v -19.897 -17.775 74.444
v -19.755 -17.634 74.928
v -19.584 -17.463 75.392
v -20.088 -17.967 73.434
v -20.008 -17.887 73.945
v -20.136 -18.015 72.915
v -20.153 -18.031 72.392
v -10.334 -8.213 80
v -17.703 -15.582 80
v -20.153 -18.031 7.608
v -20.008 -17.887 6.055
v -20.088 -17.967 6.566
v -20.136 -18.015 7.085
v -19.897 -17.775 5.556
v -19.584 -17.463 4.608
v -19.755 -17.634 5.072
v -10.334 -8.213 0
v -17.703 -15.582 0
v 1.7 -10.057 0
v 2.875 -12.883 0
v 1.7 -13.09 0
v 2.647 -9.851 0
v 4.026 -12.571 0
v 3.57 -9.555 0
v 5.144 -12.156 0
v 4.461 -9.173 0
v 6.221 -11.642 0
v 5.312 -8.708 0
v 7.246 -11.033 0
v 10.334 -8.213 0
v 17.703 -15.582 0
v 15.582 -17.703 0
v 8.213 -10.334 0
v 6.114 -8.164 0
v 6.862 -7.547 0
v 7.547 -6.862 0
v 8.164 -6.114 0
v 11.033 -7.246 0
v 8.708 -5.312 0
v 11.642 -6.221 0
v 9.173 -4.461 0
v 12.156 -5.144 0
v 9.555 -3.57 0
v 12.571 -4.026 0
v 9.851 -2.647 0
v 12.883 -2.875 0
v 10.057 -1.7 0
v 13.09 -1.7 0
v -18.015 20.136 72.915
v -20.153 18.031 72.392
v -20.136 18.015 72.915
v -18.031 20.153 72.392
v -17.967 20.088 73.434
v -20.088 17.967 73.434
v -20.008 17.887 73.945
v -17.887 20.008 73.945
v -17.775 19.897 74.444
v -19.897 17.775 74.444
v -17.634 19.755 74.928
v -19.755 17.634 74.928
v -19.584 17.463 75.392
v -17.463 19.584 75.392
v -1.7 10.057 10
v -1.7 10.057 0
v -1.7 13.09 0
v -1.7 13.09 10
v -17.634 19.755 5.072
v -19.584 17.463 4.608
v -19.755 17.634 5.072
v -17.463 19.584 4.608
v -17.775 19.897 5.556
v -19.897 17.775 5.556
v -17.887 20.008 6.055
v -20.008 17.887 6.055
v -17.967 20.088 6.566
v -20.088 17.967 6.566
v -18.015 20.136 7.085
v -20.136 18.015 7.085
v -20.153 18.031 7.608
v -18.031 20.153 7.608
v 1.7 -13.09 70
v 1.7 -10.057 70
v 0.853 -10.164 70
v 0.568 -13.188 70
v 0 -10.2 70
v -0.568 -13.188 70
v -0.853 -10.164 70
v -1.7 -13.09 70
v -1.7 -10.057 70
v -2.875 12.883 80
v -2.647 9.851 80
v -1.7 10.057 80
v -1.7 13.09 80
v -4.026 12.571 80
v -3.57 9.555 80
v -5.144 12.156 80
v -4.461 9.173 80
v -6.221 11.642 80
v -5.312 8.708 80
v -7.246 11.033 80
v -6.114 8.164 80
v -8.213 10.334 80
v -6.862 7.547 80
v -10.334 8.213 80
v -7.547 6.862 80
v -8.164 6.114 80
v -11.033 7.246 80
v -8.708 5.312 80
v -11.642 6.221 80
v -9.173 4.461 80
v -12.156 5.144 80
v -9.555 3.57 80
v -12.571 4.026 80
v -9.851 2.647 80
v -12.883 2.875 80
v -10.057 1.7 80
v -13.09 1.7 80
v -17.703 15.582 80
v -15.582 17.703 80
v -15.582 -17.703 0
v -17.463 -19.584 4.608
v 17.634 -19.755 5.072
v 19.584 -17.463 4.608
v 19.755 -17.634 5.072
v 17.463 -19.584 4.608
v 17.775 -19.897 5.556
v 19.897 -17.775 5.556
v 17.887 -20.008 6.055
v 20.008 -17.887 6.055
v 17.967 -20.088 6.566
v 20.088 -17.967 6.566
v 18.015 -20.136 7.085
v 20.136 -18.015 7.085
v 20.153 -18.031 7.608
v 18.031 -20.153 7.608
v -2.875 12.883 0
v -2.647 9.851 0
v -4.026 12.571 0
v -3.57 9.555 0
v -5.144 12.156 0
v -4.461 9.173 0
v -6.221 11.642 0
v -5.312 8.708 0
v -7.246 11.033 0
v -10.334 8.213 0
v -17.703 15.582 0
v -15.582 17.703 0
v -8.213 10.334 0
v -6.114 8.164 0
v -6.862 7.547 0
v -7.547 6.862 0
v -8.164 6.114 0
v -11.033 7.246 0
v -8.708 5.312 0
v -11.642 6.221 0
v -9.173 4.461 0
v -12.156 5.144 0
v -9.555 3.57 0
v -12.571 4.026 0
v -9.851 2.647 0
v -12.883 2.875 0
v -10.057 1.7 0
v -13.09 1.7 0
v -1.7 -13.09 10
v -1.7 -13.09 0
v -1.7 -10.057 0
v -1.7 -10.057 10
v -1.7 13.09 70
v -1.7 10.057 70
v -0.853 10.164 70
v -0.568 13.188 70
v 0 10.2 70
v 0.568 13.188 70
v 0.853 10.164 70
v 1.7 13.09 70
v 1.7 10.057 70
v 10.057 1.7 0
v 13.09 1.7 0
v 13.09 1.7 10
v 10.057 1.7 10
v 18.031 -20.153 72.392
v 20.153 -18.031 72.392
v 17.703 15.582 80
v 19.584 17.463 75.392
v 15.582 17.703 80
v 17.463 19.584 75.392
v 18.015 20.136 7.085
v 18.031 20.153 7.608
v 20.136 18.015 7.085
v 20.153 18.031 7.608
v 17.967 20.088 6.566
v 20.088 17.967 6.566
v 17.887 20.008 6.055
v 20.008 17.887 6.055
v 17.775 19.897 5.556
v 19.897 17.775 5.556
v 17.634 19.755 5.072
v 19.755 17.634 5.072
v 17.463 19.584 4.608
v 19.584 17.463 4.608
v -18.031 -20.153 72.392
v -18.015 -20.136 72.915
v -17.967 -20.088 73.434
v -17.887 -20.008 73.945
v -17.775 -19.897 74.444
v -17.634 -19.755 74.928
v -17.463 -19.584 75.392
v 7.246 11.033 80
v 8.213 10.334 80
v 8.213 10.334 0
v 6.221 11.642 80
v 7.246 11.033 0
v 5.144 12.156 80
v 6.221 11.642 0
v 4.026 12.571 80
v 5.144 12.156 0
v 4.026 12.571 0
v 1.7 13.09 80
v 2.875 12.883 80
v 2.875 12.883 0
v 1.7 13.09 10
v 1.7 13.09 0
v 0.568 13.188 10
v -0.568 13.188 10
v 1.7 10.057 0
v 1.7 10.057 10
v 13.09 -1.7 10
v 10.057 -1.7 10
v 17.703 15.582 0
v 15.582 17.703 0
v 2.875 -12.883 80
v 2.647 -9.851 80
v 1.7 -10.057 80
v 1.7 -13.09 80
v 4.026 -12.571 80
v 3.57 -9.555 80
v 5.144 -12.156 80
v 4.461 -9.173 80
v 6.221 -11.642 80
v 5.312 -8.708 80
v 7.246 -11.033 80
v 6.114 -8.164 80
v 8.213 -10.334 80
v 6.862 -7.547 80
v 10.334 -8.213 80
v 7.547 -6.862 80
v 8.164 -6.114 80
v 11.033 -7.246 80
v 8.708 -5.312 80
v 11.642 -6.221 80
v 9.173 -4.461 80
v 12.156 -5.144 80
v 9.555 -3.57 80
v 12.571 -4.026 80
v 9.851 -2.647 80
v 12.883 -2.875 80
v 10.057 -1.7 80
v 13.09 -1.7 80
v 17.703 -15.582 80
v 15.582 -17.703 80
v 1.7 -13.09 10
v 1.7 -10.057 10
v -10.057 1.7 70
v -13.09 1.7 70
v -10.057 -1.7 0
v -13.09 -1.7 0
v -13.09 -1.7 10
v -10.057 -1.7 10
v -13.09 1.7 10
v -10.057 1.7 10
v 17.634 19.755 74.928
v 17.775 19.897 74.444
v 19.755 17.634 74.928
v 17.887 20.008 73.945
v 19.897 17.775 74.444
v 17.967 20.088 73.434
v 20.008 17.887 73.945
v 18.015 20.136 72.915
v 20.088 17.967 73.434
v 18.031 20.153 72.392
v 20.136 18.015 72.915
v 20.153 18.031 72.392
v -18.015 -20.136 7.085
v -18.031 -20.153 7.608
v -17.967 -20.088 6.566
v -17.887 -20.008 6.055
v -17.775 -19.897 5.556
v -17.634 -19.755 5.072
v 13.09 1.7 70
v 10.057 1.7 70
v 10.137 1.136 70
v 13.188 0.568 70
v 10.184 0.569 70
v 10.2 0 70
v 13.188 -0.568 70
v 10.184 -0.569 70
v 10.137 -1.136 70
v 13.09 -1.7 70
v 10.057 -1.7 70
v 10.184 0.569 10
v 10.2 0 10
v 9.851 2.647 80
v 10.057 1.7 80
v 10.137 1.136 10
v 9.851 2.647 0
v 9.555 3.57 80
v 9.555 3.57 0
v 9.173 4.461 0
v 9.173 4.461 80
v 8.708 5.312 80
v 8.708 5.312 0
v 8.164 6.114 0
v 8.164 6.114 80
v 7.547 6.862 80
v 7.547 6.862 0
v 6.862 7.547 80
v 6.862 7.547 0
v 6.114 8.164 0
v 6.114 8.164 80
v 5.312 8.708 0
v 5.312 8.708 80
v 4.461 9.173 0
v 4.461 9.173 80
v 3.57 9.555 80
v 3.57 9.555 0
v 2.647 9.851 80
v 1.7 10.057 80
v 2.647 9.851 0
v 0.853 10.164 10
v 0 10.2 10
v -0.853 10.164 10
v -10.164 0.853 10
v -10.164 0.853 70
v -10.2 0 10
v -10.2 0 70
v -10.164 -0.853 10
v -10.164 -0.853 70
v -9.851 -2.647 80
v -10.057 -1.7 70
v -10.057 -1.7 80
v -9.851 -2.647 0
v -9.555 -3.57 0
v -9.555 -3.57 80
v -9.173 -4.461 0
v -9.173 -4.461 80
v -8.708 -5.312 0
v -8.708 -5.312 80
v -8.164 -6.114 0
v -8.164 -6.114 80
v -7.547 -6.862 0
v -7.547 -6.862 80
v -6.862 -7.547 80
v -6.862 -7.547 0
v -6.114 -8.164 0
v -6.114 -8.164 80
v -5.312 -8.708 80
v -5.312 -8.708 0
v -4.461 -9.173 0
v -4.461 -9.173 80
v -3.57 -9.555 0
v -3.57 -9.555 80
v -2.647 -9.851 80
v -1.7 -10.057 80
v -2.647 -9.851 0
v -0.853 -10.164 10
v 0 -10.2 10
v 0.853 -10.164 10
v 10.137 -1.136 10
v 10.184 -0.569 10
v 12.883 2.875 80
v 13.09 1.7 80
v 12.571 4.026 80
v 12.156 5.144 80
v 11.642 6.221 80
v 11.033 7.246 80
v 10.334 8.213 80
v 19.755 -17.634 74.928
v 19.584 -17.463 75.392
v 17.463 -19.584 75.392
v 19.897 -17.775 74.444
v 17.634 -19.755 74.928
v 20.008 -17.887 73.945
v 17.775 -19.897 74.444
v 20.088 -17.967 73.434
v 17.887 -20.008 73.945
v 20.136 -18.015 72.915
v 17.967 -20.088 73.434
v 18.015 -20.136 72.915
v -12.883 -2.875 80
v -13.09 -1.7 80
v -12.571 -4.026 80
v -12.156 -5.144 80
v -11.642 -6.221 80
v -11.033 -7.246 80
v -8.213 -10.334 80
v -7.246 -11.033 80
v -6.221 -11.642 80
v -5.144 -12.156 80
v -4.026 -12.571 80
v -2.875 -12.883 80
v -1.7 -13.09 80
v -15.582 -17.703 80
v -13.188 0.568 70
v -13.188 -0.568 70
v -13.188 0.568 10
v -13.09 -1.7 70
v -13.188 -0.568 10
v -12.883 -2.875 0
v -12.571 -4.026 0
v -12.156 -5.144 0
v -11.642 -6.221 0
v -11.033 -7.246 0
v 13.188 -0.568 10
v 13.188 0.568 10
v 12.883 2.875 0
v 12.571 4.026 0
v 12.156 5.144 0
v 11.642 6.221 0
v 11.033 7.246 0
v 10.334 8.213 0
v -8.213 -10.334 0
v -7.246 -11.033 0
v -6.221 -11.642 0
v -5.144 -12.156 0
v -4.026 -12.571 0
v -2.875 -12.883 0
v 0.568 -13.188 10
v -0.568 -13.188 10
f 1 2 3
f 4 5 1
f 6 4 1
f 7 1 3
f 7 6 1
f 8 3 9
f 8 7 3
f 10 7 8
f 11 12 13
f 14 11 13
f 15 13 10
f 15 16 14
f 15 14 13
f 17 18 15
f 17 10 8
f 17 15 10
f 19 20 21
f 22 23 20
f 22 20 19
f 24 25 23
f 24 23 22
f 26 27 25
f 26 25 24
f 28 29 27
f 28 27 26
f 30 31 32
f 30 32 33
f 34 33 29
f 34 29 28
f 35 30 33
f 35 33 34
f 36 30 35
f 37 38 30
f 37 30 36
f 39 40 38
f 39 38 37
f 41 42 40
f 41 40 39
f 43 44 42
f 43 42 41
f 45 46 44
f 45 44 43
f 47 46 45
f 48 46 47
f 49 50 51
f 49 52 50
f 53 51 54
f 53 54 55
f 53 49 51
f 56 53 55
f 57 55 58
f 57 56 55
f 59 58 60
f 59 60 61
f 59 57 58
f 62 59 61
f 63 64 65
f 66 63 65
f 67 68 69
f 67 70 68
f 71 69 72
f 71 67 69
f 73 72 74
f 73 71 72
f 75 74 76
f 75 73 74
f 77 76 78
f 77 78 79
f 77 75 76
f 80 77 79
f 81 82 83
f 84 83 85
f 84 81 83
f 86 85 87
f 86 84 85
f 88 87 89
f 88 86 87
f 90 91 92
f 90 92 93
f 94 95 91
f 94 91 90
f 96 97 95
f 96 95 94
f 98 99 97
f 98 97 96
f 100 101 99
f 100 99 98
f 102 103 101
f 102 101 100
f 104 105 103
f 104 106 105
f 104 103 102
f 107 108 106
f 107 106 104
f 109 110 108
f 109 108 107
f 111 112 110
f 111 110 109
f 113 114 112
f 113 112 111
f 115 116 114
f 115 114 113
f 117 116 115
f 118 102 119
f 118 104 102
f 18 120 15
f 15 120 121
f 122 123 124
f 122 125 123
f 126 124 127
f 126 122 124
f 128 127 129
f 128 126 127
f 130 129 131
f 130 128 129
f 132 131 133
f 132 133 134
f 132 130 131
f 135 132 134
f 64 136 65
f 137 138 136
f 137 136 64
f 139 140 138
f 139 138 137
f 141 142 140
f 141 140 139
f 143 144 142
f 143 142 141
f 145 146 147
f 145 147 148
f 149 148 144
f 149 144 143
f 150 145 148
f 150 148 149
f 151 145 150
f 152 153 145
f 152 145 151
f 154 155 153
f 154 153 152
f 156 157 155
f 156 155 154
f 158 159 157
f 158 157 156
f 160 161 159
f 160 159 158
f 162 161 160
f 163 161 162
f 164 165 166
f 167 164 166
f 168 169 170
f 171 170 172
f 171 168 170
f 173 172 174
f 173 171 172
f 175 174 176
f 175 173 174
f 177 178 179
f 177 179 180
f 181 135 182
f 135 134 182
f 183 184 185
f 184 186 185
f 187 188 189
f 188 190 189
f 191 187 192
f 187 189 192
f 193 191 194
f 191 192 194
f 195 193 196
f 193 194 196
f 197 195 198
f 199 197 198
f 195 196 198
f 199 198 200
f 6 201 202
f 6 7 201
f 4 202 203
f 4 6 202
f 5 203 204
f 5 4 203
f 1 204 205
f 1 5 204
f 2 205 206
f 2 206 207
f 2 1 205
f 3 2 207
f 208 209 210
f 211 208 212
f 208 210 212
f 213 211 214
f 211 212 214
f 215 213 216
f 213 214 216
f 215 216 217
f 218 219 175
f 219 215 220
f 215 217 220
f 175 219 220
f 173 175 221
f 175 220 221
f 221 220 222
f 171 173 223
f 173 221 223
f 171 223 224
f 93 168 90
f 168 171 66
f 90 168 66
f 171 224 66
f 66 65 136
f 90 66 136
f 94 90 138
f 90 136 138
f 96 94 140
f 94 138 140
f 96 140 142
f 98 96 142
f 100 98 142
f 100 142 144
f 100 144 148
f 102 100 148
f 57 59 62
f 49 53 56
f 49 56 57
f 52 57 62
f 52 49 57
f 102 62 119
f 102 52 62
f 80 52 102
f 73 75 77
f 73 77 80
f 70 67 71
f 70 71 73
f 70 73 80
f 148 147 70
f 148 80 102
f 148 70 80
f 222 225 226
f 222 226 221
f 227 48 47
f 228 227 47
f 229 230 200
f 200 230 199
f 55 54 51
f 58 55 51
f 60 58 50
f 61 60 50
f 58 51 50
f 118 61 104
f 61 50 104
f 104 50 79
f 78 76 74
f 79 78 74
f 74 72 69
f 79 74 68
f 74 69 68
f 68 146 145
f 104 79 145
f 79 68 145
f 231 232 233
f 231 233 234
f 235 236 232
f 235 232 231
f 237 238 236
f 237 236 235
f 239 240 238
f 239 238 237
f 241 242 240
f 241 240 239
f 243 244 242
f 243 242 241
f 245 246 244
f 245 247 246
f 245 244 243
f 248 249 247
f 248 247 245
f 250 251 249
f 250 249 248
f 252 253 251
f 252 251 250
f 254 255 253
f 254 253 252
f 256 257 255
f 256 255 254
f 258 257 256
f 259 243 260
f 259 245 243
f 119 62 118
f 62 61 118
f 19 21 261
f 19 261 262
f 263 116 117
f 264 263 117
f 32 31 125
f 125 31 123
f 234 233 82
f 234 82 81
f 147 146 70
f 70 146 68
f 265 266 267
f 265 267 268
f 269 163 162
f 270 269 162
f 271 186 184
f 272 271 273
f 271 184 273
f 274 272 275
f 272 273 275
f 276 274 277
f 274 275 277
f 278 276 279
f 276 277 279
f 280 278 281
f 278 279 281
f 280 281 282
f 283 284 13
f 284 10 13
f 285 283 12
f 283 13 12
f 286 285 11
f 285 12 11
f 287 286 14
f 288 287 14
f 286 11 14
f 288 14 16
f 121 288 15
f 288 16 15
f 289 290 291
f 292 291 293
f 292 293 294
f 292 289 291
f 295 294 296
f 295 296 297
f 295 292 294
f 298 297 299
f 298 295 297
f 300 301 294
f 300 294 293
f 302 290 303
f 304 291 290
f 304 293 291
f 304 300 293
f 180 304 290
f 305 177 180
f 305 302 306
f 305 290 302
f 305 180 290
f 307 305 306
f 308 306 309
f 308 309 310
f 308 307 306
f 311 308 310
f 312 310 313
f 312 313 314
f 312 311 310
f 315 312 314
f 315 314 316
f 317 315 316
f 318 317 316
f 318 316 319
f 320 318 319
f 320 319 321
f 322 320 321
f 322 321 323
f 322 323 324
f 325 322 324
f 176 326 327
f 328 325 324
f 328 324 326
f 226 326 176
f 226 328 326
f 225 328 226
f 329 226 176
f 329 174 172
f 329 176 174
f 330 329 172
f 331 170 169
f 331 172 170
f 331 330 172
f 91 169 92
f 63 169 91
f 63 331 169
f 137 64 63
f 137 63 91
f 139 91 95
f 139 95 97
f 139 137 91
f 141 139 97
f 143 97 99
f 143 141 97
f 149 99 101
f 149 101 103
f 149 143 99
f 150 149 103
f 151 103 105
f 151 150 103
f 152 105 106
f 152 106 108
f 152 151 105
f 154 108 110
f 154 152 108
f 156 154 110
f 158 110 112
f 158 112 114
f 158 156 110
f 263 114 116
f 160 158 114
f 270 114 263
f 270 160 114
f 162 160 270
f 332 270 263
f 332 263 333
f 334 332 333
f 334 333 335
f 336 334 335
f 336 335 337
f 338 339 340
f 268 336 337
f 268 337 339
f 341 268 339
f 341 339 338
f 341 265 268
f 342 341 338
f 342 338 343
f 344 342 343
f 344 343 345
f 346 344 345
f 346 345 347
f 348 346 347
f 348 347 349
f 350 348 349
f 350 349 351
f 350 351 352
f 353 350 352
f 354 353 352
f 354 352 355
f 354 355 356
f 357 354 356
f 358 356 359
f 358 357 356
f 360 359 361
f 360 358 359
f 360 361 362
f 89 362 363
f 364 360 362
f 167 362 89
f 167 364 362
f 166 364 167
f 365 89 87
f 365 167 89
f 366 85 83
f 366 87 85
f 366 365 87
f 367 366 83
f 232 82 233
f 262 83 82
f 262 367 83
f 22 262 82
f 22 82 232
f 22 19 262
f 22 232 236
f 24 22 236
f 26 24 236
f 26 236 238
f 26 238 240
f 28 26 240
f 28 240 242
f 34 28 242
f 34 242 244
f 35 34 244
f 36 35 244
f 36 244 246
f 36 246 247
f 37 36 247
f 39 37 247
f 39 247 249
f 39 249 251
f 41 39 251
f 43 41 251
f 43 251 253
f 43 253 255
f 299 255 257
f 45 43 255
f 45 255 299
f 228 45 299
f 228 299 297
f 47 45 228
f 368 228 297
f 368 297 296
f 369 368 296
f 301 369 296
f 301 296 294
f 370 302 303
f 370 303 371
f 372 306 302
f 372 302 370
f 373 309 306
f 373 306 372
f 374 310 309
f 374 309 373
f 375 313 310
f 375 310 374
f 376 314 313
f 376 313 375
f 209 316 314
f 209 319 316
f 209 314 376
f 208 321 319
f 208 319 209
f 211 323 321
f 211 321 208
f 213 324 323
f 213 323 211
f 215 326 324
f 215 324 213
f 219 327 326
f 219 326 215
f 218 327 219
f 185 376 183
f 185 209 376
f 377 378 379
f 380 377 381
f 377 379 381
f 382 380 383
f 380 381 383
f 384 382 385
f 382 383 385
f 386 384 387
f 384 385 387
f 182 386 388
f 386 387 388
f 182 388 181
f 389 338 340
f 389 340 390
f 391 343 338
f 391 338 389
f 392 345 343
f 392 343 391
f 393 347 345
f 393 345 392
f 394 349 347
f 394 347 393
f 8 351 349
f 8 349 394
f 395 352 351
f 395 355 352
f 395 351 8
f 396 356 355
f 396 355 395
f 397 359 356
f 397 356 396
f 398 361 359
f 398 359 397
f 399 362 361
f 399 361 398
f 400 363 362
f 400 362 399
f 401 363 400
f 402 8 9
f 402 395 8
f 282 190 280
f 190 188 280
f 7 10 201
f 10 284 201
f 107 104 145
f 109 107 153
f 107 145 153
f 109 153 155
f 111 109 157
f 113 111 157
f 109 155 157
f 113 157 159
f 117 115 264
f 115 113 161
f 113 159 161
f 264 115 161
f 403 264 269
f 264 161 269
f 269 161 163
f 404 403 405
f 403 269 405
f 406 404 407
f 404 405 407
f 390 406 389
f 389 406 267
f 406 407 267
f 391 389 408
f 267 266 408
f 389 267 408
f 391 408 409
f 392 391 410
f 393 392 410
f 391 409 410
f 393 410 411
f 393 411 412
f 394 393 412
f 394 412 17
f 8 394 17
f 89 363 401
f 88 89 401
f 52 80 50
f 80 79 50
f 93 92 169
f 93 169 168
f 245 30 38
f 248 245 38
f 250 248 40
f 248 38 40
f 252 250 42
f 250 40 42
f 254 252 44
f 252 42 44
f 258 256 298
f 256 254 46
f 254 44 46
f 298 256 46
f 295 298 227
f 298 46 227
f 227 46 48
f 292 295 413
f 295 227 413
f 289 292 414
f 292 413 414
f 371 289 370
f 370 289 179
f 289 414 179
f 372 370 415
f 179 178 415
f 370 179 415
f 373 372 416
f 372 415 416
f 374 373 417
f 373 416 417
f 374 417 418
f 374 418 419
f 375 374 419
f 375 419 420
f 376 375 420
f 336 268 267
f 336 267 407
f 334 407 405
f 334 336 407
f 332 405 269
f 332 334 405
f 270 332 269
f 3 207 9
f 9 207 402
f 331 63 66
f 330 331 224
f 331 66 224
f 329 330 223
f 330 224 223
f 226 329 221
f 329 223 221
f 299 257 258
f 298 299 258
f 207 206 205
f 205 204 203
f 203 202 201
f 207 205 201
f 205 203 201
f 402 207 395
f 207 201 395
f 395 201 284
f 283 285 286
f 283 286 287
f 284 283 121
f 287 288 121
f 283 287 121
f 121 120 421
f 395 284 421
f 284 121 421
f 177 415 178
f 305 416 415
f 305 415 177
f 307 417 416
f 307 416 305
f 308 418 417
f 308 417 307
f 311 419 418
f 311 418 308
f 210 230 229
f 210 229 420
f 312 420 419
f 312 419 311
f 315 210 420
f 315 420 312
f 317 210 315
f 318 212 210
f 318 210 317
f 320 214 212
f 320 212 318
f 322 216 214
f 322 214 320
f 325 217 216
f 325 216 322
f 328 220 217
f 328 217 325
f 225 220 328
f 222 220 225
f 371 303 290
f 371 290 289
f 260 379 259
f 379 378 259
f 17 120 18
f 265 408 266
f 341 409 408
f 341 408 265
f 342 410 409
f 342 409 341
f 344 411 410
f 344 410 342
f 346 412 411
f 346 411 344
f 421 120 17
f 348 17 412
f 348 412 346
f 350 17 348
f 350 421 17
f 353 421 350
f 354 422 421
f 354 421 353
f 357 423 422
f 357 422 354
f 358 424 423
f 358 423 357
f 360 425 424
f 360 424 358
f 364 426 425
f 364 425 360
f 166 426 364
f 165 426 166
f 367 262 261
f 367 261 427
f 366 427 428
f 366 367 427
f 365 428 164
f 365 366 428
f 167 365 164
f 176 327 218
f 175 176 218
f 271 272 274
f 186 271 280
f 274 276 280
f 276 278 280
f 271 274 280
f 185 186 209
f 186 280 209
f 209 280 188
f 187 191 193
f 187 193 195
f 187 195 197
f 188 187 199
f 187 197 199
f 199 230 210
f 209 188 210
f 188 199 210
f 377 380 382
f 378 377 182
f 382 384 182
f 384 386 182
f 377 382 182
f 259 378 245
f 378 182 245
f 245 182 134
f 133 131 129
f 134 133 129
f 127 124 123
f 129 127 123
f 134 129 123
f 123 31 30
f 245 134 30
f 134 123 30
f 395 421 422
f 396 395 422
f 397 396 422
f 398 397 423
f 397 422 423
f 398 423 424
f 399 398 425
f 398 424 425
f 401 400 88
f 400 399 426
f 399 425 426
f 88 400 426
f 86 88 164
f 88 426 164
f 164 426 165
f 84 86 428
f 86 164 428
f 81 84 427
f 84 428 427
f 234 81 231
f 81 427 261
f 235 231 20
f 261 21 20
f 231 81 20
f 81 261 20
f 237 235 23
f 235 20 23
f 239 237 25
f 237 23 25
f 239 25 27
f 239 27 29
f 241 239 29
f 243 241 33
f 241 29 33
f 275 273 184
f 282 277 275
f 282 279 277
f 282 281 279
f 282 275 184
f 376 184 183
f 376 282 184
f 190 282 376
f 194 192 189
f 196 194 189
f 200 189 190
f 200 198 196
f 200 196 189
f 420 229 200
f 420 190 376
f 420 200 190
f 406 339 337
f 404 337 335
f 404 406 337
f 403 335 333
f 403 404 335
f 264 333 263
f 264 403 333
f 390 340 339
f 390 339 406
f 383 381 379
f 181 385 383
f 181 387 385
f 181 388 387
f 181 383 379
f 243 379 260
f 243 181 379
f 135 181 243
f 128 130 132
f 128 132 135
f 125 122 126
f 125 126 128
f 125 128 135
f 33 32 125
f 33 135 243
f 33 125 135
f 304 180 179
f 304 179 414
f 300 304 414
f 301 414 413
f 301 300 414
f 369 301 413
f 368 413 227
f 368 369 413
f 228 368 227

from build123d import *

# Parameters (mm, degrees)
SKETCH1_R                = 13.2
SKETCH1_R_2              = 10.2
BOSS_EXTRUDE1_DEPTH      = 80
SKETCH2_W                = 3.4
SKETCH2_H                = 3.142664369
CUT_EXTRUDE1_DEPTH       = 10
CIRPATTERN1_COUNT        = 4
MIRROR1_COPY_1_SKETCH_W  = 3.4
MIRROR1_COPY_1_SKETCH_H  = 3.142664369
MIRROR1_COPY_1_DEPTH     = 10
MIRROR1_COPY_2_SKETCH_W  = 3.4
MIRROR1_COPY_2_SKETCH_H  = 3.142664369
MIRROR1_COPY_2_DEPTH     = 10
MIRROR1_COPY_3_SKETCH_W  = 3.4
MIRROR1_COPY_3_SKETCH_H  = 3.142664369
MIRROR1_COPY_3_DEPTH     = 10
BOSS_EXTRUDE3_DEPTH      = 1.5
FILLET1_R                = 6
CIRPATTERN2_COUNT        = 4
FILLET1_OF_CIRPATTERN2_R = 6


with BuildPart() as part:
    # Sketch1 → Boss-Extrude1 (new body)
    with BuildSketch(Plane.XY):
        Circle(SKETCH1_R)
        Circle(SKETCH1_R_2, mode=Mode.SUBTRACT)
    extrude(amount=BOSS_EXTRUDE1_DEPTH)

    # Sketch2 → Cut-Extrude1 (cut)
    with BuildSketch(Plane.XY.offset(80)):
        with Locations((0, 11.628667816)):
            Rectangle(SKETCH2_W, SKETCH2_H)
    cut_extrude1 = extrude(amount=-CUT_EXTRUDE1_DEPTH, mode=Mode.SUBTRACT)

    # CirPattern1: Cut-Extrude1 ×4 about axis
    cirpattern1_axis = Axis((0, 0, 0), (0, 0, 1))
    for i in range(1, CIRPATTERN1_COUNT):
        add(cut_extrude1.rotate(cirpattern1_axis, i * 360 / CIRPATTERN1_COUNT), mode=Mode.SUBTRACT)

    # Mirror1: Cut-Extrude1 across plane
    add(cut_extrude1.mirror(Plane.XY.offset(40)), mode=Mode.SUBTRACT)

    # Mirror1 copy 1 sketch → Mirror1 copy 1 (cut)
    with BuildSketch(Plane.YX):
        with Locations((0, -11.628667816)):
            Rectangle(MIRROR1_COPY_1_SKETCH_W, MIRROR1_COPY_1_SKETCH_H)
    extrude(amount=-MIRROR1_COPY_1_DEPTH, mode=Mode.SUBTRACT)

    # Mirror1 copy 2 sketch → Mirror1 copy 2 (cut)
    with BuildSketch(Plane(origin=(0, 0, 0), x_dir=(-1, 0, 0), z_dir=(0, 0, -1))):
        with Locations((0, -11.628667816)):
            Rectangle(MIRROR1_COPY_2_SKETCH_W, MIRROR1_COPY_2_SKETCH_H)
    extrude(amount=-MIRROR1_COPY_2_DEPTH, mode=Mode.SUBTRACT)

    # Mirror1 copy 3 sketch → Mirror1 copy 3 (cut)
    with BuildSketch(Plane(origin=(0, 0, 0), x_dir=(0, -1, 0), z_dir=(0, 0, -1))):
        with Locations((0, -11.628667816)):
            Rectangle(MIRROR1_COPY_3_SKETCH_W, MIRROR1_COPY_3_SKETCH_H)
    extrude(amount=-MIRROR1_COPY_3_DEPTH, mode=Mode.SUBTRACT)

    # Sketch5 → Boss-Extrude3 (add, symmetric)
    with BuildSketch(Plane(origin=(0, 0, 0), x_dir=(-0.70710678118655, -0.7071067811865451, 0), z_dir=(0.7071067811865451, -0.70710678118655, 0))):
        Polygon((11.2, 0), (13.2, 0), (23.535898385, 0), (27, -6), (27, -74), (23.535898385, -80), (13.2, -80), (11.2, -80), align=None)
    boss_extrude3 = extrude(amount=BOSS_EXTRUDE3_DEPTH, both=True)

    # Fillet1
    fillet1_edges = [part.edges().sort_by_distance(p)[0] for p in [
        (-19.091883092, -19.091883092, 74),
        (-19.091883092, -19.091883092, 6),
    ]]
    fillet(fillet1_edges, radius=FILLET1_R)

    # CirPattern2: Boss-Extrude3 ×4 about axis
    cirpattern2_axis = Axis((0, 0, 0), (0, 0, 1))
    for i in range(1, CIRPATTERN2_COUNT):
        add(boss_extrude3.rotate(cirpattern2_axis, i * 360 / CIRPATTERN2_COUNT))

    # Fillet1 of CirPattern2
    fillet1_of_cirpattern2_edges = [part.edges().sort_by_distance(p)[0] for p in [
        (19.091883092, -19.091883092, 74),
        (19.091883092, -19.091883092, 6),
        (19.091883092, 19.091883092, 74),
        (19.091883092, 19.091883092, 6),
        (-19.091883092, 19.091883092, 74),
        (-19.091883092, 19.091883092, 6),
    ]]
    fillet(fillet1_of_cirpattern2_edges, radius=FILLET1_OF_CIRPATTERN2_R)


solid = part.part
